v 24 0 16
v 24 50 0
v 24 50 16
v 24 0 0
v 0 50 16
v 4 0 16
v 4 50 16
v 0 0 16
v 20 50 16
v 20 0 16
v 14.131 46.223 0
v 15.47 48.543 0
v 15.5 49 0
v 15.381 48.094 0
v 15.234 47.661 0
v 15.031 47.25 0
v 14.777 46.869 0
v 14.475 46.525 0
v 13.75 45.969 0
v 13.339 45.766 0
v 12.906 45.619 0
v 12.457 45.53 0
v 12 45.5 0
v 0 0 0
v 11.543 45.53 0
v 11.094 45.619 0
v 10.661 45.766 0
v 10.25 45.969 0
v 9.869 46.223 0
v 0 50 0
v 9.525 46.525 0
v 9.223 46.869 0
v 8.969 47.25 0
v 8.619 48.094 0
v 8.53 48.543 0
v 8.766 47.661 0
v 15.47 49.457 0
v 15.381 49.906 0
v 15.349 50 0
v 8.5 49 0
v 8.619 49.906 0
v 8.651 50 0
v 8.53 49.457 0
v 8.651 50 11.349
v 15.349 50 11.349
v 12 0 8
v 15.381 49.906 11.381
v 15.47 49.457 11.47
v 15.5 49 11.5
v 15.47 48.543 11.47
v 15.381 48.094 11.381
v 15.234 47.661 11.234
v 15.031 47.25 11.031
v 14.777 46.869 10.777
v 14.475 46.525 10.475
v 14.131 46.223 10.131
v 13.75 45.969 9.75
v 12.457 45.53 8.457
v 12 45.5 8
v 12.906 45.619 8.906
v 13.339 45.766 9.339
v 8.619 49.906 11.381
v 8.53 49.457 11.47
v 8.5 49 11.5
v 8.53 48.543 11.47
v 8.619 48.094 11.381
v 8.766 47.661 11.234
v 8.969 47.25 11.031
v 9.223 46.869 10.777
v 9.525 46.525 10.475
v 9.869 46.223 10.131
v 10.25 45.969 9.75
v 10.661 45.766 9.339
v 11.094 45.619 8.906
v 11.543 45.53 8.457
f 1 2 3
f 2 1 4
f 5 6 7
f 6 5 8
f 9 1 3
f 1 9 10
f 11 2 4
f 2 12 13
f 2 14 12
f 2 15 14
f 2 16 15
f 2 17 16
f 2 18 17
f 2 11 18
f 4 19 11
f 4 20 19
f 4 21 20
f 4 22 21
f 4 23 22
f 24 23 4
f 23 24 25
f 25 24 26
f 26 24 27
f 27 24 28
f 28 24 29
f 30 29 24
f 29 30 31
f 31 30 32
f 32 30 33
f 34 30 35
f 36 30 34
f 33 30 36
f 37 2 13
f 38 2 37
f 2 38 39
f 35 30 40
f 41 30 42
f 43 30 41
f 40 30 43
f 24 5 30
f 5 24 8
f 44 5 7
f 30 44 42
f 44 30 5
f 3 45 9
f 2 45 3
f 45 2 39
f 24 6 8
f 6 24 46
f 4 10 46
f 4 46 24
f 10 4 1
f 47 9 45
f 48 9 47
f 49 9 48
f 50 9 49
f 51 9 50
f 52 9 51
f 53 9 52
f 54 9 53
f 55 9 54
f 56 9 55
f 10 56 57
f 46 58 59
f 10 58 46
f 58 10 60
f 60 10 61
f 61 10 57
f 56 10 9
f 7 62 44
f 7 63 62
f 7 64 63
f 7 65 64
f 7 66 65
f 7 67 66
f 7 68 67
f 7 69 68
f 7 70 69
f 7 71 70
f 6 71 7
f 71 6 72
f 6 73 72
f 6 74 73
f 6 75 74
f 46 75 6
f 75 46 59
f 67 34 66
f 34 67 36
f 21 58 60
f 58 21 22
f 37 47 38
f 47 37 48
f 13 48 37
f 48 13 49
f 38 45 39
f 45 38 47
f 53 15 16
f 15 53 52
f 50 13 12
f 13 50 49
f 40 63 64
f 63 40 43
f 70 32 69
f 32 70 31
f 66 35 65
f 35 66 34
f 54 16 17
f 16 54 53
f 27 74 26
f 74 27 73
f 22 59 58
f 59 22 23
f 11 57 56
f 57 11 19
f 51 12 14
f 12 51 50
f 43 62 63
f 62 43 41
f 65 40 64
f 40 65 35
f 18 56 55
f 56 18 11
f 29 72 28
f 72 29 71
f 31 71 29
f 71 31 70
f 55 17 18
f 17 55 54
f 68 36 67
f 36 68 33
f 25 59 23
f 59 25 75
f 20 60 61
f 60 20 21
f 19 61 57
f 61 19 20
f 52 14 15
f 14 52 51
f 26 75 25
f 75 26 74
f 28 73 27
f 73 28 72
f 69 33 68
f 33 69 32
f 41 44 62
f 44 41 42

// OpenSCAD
//=====================================================================
// BlitzBox
//
// CableGuide.scad
//
// Cable guide for H-Field UTP cable
//=====================================================================


//--------------------------------------------------
// Dimensions
//--------------------------------------------------

guide_length = 50;
guide_width  = 24;
guide_height = 16;

v_depth = 8;

cable_diameter = 7;
cable_radius   = cable_diameter / 2;

side_channel_y = guide_length - 8;


//=====================================================================
// Cable guide
//=====================================================================

module cable_guide()
{

    difference()
    {

        //--------------------------------------------------
        // Base block
        //--------------------------------------------------

        cube([
            guide_width,
            guide_length,
            guide_height
        ]);


       //--------------------------------------------------
// Top V groove
//--------------------------------------------------

translate([
    guide_width / 2,
    guide_length + 1,
    guide_height
])

rotate([90,0,0])

cylinder(
    h = guide_length + 2,
    r = v_depth,
    $fn = 4
);


//--------------------------------------------------
// Vertical cable channel
//--------------------------------------------------

translate([
    guide_width / 2,
    guide_length - 1,
    -1
])

cylinder(
    h = guide_height + 2,
    r = cable_radius,
    $fn = 48
);

    }

}


cable_guide();
